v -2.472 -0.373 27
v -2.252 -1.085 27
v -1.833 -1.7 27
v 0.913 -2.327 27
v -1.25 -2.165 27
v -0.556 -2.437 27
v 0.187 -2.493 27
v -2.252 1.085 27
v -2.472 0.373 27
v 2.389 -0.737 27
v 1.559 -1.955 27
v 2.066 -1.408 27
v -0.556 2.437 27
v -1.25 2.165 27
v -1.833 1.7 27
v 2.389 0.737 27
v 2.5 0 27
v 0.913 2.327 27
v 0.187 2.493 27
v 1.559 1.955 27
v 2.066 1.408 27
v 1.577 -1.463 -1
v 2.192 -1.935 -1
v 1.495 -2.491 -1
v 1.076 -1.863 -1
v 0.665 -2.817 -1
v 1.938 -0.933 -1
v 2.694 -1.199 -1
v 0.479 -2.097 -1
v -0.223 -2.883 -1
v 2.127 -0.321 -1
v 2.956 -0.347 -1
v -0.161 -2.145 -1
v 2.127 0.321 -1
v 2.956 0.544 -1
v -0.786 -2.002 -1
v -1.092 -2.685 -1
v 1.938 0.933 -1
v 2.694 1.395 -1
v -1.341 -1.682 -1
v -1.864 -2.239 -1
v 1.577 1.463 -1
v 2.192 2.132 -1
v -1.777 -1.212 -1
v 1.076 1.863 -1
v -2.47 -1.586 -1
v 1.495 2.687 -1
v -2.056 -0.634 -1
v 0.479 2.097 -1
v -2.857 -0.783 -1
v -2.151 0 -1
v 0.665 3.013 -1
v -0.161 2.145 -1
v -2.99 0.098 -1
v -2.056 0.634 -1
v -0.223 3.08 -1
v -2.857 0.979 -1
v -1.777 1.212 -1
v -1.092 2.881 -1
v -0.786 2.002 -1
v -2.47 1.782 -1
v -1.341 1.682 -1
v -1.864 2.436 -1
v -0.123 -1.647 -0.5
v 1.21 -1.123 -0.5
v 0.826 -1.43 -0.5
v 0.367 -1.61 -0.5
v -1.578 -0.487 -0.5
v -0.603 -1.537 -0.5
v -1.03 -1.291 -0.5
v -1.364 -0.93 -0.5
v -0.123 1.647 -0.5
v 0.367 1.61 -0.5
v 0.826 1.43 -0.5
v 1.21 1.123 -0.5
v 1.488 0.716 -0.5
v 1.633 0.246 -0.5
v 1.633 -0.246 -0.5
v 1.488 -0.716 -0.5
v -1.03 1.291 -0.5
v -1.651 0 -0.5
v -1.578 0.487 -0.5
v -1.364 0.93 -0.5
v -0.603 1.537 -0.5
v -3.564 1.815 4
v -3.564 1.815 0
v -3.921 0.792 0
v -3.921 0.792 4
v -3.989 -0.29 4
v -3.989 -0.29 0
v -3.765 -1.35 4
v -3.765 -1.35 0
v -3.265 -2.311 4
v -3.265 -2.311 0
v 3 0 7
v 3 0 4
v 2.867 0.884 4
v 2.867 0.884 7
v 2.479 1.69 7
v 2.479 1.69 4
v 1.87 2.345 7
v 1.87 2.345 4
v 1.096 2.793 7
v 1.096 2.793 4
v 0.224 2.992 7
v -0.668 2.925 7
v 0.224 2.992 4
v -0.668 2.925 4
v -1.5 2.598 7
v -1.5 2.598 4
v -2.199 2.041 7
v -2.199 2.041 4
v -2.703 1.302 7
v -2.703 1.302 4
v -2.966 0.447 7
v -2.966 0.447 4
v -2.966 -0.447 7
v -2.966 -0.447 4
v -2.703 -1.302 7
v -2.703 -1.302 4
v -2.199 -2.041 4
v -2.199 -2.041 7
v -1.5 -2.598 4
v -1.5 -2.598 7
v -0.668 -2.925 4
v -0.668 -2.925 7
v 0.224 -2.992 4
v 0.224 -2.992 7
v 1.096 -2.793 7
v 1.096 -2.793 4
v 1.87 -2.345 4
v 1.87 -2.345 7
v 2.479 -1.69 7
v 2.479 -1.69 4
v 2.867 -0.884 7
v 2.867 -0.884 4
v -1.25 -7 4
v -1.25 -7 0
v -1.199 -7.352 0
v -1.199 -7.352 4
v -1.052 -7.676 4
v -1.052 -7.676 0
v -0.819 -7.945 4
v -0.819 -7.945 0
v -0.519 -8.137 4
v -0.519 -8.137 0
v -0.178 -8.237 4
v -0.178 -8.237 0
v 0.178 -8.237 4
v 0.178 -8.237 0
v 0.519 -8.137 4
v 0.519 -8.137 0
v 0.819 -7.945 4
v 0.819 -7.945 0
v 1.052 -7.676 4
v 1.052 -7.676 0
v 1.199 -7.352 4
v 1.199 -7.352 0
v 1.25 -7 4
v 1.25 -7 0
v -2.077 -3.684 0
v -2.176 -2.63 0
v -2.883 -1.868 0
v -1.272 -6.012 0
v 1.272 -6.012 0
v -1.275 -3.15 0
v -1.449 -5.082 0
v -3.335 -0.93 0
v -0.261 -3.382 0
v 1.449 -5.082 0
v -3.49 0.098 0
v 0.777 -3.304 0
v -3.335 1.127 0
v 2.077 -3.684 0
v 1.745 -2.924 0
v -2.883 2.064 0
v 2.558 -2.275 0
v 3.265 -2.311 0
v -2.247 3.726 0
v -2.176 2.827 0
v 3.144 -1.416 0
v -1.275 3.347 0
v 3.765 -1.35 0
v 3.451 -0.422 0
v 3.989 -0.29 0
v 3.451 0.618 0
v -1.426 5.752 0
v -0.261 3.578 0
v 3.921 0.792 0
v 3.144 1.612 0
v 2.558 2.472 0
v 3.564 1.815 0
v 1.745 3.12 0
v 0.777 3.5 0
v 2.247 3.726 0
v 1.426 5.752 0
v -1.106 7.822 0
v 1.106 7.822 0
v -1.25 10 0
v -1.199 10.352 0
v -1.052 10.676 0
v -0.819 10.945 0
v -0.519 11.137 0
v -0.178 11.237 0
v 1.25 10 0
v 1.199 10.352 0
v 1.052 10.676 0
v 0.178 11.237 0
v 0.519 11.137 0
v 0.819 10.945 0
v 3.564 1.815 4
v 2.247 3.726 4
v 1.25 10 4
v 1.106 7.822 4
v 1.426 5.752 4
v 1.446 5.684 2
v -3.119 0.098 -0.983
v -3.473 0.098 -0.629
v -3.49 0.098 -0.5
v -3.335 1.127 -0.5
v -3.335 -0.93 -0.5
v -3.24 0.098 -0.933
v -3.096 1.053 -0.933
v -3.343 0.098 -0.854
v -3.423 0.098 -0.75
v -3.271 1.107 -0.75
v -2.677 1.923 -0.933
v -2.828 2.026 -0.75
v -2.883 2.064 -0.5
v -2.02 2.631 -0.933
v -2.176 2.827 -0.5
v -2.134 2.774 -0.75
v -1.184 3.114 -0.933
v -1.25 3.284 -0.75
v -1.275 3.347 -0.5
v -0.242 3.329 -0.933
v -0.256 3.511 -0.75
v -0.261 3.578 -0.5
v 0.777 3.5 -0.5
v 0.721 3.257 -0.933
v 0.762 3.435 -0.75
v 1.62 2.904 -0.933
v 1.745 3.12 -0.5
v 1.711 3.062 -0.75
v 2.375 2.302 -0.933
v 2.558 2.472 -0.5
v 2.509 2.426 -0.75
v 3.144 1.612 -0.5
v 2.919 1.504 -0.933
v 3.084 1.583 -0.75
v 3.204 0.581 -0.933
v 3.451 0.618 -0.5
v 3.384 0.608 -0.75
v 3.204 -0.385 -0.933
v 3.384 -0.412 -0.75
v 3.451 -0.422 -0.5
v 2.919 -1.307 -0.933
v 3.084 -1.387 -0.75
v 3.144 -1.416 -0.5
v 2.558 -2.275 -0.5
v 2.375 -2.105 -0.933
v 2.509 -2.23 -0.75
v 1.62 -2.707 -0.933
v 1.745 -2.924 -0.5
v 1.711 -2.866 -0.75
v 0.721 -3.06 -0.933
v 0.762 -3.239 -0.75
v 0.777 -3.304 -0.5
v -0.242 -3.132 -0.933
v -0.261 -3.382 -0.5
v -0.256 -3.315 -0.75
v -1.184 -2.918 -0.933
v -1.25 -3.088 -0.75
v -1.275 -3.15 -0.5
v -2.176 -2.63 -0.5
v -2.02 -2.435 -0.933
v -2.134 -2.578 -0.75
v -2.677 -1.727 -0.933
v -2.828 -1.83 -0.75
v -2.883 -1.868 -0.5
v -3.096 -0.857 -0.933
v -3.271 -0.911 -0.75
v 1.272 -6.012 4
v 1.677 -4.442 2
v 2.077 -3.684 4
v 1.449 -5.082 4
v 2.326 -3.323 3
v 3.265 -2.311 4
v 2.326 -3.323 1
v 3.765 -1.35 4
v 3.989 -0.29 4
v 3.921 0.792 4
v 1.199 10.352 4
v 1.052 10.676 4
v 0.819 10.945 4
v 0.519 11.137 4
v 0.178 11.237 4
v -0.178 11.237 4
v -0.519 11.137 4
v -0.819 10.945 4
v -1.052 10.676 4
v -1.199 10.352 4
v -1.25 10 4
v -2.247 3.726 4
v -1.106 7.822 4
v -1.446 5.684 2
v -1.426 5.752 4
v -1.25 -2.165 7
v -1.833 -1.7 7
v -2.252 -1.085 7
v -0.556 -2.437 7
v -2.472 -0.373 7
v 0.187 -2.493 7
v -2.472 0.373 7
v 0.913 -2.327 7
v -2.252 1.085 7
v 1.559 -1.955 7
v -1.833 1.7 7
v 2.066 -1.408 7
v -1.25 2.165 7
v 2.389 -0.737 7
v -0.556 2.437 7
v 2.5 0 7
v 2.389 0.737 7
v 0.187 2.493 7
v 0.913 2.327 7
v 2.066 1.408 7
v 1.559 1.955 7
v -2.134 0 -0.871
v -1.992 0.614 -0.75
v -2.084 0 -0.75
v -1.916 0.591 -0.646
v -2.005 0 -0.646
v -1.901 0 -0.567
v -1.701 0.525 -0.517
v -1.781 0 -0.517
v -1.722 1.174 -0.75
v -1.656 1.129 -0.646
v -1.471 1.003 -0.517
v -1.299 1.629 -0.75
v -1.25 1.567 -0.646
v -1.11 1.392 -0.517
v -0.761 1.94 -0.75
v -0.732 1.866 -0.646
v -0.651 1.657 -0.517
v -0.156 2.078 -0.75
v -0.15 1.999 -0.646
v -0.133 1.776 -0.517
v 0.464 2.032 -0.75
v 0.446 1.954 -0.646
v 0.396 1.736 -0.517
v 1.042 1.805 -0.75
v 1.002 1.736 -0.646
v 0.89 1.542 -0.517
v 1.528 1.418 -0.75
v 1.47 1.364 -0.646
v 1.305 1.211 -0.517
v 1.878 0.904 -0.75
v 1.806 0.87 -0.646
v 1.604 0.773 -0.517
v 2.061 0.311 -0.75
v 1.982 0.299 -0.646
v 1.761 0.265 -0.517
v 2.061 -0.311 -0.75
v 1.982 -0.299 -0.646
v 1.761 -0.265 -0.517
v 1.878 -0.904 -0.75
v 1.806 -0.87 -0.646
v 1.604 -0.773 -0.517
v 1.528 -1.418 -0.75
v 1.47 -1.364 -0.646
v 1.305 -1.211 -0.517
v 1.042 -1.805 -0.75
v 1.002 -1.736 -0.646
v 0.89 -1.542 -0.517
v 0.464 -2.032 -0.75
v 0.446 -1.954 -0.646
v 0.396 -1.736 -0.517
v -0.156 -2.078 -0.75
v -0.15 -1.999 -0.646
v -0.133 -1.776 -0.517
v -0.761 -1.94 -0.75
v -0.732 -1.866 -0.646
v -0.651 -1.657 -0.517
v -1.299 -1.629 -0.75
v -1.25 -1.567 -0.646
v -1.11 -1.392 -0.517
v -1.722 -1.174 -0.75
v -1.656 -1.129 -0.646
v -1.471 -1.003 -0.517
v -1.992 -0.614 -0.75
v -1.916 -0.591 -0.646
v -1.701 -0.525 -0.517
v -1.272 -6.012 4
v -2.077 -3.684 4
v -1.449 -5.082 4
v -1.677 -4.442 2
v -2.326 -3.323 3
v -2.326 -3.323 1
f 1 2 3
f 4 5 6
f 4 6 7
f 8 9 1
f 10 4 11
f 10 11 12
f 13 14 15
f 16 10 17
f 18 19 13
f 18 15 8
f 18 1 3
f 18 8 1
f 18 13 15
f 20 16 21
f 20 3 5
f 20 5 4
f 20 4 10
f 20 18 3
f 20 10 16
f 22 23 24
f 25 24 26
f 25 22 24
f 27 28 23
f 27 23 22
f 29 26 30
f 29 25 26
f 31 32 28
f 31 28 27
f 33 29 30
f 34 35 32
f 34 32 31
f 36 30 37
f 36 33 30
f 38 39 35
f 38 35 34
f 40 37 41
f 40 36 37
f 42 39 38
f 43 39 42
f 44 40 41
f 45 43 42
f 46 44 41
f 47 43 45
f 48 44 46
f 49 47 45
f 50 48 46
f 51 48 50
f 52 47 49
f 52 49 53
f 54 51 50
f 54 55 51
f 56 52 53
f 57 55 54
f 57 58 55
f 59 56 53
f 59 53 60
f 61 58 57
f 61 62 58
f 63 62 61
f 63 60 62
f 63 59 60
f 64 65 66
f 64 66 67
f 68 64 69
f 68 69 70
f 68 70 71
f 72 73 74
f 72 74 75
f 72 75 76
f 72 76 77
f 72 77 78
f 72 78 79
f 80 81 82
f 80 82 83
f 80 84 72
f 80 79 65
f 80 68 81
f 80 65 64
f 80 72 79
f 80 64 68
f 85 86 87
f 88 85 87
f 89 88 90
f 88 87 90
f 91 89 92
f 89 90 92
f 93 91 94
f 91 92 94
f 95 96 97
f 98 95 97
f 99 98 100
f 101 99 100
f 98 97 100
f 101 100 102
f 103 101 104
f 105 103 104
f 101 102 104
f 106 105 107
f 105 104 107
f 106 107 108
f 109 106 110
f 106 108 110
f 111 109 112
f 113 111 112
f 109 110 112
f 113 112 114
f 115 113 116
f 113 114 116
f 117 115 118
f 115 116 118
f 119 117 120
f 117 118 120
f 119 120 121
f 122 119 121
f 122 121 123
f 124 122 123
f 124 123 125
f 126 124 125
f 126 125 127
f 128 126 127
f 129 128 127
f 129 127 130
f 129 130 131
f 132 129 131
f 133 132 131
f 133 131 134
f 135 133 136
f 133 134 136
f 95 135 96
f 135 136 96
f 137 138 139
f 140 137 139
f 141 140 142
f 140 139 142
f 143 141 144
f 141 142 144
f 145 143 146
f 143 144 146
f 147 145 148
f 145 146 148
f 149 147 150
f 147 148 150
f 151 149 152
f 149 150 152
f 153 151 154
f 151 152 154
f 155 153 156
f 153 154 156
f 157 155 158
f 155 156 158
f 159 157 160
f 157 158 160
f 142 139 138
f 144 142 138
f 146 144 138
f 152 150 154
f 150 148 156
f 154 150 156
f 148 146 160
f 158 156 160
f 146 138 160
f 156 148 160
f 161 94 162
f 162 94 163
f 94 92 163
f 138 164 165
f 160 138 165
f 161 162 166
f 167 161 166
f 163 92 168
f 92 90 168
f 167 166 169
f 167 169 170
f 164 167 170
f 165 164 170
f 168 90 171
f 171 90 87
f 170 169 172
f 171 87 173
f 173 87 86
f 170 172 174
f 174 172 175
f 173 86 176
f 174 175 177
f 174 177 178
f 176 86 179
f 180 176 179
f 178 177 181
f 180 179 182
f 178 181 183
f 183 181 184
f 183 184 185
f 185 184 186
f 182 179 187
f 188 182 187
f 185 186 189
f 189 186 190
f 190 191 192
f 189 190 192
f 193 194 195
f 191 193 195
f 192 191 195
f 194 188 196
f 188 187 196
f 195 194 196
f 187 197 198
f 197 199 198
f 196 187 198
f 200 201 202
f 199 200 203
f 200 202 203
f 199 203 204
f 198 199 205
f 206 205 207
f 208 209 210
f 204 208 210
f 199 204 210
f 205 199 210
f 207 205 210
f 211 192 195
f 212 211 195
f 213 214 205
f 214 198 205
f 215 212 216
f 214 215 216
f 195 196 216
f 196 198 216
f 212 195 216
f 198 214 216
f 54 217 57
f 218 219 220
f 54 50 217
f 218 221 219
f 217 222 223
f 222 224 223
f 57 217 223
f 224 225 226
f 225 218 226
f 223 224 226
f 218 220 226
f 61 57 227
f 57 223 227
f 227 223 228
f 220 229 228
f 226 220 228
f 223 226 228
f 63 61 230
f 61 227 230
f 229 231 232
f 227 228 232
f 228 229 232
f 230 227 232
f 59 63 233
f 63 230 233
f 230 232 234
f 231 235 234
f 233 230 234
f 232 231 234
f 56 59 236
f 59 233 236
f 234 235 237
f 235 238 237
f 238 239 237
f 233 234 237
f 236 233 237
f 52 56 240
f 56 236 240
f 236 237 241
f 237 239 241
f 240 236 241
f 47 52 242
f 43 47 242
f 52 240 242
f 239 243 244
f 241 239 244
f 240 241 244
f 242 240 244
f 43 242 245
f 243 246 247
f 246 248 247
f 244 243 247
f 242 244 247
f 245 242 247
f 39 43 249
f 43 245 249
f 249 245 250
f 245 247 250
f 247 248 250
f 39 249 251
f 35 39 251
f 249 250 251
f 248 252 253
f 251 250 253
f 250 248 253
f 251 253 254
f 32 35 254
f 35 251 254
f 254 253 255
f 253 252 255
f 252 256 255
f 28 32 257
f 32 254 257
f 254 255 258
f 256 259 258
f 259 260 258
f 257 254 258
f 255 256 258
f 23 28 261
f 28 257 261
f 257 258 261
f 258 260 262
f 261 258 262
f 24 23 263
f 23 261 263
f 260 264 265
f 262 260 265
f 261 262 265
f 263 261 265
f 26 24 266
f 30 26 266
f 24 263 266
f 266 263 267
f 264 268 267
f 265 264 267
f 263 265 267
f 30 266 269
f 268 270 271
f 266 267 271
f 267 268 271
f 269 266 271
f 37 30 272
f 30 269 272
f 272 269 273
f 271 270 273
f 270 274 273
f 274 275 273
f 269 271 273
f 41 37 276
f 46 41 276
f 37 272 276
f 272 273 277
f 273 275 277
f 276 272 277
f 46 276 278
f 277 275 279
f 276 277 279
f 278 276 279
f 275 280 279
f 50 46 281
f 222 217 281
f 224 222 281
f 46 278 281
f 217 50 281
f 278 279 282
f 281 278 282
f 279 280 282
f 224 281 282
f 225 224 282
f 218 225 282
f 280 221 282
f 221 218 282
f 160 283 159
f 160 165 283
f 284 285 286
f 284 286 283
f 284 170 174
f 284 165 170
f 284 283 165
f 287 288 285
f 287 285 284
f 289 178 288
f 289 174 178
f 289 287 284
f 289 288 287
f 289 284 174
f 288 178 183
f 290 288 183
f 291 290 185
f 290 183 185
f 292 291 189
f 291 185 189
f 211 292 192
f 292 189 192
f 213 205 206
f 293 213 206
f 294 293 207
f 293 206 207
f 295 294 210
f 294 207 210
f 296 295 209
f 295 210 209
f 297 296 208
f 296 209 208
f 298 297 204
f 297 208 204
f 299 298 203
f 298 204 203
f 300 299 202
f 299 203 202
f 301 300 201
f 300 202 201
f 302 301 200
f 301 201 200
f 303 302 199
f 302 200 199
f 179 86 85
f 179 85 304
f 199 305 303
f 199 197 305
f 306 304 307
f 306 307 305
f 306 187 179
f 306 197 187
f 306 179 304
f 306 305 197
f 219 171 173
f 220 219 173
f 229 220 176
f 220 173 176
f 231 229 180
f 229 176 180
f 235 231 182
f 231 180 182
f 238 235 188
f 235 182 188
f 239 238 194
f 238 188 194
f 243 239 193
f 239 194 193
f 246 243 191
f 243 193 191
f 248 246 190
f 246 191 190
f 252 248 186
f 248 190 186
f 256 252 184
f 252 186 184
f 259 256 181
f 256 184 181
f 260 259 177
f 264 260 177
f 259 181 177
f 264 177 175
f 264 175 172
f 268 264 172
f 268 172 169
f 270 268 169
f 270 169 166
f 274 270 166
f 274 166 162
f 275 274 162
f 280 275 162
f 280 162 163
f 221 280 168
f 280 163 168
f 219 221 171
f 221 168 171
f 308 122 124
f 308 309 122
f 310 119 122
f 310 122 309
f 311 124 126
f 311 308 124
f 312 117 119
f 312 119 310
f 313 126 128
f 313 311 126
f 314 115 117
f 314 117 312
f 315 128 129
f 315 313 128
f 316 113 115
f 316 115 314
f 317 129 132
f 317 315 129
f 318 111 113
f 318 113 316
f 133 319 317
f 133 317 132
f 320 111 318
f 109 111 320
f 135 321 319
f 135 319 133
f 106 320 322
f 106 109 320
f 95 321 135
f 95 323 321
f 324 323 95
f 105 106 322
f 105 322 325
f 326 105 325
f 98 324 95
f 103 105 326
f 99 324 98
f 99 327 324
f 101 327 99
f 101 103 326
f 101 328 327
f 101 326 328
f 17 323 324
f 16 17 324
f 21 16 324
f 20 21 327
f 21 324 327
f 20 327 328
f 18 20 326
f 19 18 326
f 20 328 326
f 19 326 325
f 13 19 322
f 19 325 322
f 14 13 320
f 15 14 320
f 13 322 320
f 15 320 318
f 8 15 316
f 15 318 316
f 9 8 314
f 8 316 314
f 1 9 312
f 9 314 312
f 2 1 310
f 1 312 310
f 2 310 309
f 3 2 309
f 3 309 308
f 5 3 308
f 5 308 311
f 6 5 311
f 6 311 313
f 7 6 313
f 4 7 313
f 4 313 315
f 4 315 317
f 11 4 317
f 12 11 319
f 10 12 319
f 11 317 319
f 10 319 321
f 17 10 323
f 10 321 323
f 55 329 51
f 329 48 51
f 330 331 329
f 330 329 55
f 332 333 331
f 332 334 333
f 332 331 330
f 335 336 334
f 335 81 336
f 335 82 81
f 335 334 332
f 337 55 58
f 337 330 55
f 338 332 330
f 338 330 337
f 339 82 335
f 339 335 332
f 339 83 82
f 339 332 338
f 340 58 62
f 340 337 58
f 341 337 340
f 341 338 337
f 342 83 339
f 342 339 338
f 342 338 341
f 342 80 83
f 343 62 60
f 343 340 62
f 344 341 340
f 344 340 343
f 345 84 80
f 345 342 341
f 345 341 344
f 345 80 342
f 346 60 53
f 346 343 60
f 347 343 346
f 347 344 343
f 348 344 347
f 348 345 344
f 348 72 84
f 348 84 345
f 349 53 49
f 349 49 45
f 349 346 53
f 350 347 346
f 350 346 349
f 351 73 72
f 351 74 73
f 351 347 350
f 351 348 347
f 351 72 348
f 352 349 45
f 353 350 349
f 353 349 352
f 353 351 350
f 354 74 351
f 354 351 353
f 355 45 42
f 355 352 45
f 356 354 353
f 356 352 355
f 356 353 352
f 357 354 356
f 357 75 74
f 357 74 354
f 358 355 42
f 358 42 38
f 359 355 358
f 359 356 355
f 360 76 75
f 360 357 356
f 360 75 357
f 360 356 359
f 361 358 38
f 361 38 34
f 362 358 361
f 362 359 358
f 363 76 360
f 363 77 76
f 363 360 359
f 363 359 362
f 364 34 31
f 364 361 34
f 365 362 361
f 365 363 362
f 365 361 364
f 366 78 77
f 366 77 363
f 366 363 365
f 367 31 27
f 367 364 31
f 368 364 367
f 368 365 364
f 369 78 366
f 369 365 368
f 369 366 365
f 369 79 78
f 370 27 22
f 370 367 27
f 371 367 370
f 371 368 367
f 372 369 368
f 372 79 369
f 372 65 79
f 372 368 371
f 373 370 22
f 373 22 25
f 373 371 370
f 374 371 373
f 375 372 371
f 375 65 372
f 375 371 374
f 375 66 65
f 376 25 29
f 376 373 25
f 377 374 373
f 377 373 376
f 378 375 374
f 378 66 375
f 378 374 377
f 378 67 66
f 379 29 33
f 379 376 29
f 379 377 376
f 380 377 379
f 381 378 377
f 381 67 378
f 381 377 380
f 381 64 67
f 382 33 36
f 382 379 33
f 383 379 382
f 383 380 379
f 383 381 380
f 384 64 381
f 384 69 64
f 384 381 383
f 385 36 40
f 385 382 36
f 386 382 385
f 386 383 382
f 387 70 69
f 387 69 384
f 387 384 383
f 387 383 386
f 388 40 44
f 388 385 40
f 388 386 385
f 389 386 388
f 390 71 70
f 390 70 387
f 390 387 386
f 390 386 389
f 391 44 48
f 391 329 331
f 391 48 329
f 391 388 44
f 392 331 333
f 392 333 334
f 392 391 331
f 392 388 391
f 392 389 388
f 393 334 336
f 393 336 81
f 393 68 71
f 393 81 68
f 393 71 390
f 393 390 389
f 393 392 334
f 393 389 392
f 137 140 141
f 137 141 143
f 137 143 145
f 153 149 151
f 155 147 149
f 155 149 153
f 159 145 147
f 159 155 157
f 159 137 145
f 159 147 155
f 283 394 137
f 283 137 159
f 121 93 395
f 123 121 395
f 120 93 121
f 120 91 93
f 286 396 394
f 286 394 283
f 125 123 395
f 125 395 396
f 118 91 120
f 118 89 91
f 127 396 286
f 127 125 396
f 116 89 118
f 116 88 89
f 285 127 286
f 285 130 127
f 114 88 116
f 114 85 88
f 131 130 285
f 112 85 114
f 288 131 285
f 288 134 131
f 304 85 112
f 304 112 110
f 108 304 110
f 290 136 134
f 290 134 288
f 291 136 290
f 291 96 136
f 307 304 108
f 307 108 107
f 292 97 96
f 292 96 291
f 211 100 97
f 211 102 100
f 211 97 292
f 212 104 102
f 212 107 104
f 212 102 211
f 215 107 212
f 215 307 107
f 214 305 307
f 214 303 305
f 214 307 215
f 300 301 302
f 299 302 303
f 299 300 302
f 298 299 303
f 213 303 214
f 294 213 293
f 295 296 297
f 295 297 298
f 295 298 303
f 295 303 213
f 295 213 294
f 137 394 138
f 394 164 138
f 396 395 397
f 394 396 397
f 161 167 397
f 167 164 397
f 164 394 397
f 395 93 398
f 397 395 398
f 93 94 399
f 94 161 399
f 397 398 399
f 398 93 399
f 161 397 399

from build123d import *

# Parameters (mm, degrees)
EXTRUDE_1_DEPTH     = 4
SKETCH_2_R          = 3.489709511
EXTRUDE_2_DEPTH     = 1
SKETCH_3_R          = 2.151097983
CUT_EXTRUDE_1_DEPTH = 0.5
FILLET_1_R          = 0.5
FILLET_2_R          = 0.5
SKETCH_4_R          = 3
EXTRUDE_3_DEPTH     = 3
SKETCH_5_R          = 2.5
EXTRUDE_4_DEPTH     = 20


with BuildPart() as part:
    # 草图1 → 凸台-拉伸1 (new body)
    with BuildSketch(Plane.XY):
        with BuildLine():
            ThreePointArc((3.264818601, -2.311051601), (3.989491131, -0.289759403), (3.564498931, 1.815033712))
            add(Edge.make_bspline(
                [(3.564498931, 1.815033712), (0.483839944, 5.460493331), (1.25, 10)],
                knots=[0, 0, 0, 1, 1, 1], degree=2))
            ThreePointArc((1.25, 10), (0, 11.25), (-1.25, 10))
            add(Edge.make_bspline(
                [(-3.564498931, 1.815033712), (-0.483839944, 5.460493331), (-1.25, 10)],
                knots=[0, 0, 0, 1, 1, 1], degree=2))
            ThreePointArc((-3.564498931, 1.815033712), (-3.989491131, -0.289759403), (-3.264818601, -2.311051601))
            add(Edge.make_bspline(
                [(-3.264818601, -2.311051601), (-1.095834513, -4.228126611), (-1.25, -7)],
                knots=[0, 0, 0, 1, 1, 1], degree=2))
            ThreePointArc((-1.25, -7), (0, -8.25), (1.25, -7))
            add(Edge.make_bspline(
                [(3.264818601, -2.311051601), (1.095834513, -4.228126611), (1.25, -7)],
                knots=[0, 0, 0, 1, 1, 1], degree=2))
        make_face()
    extrude(amount=EXTRUDE_1_DEPTH)

    # 草图2 → 凸台-拉伸2 (add)
    with BuildSketch(Plane(origin=(0, 0, 0), x_dir=(-1, 0, 0), z_dir=(0, 0, -1))):
        with Locations((0, 0.098197479)):
            Circle(SKETCH_2_R)
    extrude(amount=EXTRUDE_2_DEPTH)

    # 草图3 → 切除-拉伸1 (cut)
    with BuildSketch(Plane(origin=(0, 0, -1), x_dir=(-1, 0, 0), z_dir=(0, 0, -1))):
        Circle(SKETCH_3_R)
    extrude(amount=-CUT_EXTRUDE_1_DEPTH, mode=Mode.SUBTRACT)

    # 圆角1
    fillet_1_edges = [part.edges().sort_by_distance(p)[0] for p in [
        (2.151097983, 0, -0.5),
    ]]
    fillet(fillet_1_edges, radius=FILLET_1_R - 0.0001)  # a hair under: the kernel refuses the full size

    # 圆角2
    fillet_2_edges = [part.edges().sort_by_distance(p)[0] for p in [
        (3.489709511, 0.098197479, -1),
    ]]
    fillet(fillet_2_edges, radius=FILLET_2_R)

    # 草图4 → 凸台-拉伸3 (add)
    with BuildSketch(Plane.XY.offset(4)):
        Circle(SKETCH_4_R)
    extrude(amount=EXTRUDE_3_DEPTH)

    # 草图5 → 凸台-拉伸4 (add)
    with BuildSketch(Plane.XY.offset(7)):
        Circle(SKETCH_5_R)
    extrude(amount=EXTRUDE_4_DEPTH)


solid = part.part
